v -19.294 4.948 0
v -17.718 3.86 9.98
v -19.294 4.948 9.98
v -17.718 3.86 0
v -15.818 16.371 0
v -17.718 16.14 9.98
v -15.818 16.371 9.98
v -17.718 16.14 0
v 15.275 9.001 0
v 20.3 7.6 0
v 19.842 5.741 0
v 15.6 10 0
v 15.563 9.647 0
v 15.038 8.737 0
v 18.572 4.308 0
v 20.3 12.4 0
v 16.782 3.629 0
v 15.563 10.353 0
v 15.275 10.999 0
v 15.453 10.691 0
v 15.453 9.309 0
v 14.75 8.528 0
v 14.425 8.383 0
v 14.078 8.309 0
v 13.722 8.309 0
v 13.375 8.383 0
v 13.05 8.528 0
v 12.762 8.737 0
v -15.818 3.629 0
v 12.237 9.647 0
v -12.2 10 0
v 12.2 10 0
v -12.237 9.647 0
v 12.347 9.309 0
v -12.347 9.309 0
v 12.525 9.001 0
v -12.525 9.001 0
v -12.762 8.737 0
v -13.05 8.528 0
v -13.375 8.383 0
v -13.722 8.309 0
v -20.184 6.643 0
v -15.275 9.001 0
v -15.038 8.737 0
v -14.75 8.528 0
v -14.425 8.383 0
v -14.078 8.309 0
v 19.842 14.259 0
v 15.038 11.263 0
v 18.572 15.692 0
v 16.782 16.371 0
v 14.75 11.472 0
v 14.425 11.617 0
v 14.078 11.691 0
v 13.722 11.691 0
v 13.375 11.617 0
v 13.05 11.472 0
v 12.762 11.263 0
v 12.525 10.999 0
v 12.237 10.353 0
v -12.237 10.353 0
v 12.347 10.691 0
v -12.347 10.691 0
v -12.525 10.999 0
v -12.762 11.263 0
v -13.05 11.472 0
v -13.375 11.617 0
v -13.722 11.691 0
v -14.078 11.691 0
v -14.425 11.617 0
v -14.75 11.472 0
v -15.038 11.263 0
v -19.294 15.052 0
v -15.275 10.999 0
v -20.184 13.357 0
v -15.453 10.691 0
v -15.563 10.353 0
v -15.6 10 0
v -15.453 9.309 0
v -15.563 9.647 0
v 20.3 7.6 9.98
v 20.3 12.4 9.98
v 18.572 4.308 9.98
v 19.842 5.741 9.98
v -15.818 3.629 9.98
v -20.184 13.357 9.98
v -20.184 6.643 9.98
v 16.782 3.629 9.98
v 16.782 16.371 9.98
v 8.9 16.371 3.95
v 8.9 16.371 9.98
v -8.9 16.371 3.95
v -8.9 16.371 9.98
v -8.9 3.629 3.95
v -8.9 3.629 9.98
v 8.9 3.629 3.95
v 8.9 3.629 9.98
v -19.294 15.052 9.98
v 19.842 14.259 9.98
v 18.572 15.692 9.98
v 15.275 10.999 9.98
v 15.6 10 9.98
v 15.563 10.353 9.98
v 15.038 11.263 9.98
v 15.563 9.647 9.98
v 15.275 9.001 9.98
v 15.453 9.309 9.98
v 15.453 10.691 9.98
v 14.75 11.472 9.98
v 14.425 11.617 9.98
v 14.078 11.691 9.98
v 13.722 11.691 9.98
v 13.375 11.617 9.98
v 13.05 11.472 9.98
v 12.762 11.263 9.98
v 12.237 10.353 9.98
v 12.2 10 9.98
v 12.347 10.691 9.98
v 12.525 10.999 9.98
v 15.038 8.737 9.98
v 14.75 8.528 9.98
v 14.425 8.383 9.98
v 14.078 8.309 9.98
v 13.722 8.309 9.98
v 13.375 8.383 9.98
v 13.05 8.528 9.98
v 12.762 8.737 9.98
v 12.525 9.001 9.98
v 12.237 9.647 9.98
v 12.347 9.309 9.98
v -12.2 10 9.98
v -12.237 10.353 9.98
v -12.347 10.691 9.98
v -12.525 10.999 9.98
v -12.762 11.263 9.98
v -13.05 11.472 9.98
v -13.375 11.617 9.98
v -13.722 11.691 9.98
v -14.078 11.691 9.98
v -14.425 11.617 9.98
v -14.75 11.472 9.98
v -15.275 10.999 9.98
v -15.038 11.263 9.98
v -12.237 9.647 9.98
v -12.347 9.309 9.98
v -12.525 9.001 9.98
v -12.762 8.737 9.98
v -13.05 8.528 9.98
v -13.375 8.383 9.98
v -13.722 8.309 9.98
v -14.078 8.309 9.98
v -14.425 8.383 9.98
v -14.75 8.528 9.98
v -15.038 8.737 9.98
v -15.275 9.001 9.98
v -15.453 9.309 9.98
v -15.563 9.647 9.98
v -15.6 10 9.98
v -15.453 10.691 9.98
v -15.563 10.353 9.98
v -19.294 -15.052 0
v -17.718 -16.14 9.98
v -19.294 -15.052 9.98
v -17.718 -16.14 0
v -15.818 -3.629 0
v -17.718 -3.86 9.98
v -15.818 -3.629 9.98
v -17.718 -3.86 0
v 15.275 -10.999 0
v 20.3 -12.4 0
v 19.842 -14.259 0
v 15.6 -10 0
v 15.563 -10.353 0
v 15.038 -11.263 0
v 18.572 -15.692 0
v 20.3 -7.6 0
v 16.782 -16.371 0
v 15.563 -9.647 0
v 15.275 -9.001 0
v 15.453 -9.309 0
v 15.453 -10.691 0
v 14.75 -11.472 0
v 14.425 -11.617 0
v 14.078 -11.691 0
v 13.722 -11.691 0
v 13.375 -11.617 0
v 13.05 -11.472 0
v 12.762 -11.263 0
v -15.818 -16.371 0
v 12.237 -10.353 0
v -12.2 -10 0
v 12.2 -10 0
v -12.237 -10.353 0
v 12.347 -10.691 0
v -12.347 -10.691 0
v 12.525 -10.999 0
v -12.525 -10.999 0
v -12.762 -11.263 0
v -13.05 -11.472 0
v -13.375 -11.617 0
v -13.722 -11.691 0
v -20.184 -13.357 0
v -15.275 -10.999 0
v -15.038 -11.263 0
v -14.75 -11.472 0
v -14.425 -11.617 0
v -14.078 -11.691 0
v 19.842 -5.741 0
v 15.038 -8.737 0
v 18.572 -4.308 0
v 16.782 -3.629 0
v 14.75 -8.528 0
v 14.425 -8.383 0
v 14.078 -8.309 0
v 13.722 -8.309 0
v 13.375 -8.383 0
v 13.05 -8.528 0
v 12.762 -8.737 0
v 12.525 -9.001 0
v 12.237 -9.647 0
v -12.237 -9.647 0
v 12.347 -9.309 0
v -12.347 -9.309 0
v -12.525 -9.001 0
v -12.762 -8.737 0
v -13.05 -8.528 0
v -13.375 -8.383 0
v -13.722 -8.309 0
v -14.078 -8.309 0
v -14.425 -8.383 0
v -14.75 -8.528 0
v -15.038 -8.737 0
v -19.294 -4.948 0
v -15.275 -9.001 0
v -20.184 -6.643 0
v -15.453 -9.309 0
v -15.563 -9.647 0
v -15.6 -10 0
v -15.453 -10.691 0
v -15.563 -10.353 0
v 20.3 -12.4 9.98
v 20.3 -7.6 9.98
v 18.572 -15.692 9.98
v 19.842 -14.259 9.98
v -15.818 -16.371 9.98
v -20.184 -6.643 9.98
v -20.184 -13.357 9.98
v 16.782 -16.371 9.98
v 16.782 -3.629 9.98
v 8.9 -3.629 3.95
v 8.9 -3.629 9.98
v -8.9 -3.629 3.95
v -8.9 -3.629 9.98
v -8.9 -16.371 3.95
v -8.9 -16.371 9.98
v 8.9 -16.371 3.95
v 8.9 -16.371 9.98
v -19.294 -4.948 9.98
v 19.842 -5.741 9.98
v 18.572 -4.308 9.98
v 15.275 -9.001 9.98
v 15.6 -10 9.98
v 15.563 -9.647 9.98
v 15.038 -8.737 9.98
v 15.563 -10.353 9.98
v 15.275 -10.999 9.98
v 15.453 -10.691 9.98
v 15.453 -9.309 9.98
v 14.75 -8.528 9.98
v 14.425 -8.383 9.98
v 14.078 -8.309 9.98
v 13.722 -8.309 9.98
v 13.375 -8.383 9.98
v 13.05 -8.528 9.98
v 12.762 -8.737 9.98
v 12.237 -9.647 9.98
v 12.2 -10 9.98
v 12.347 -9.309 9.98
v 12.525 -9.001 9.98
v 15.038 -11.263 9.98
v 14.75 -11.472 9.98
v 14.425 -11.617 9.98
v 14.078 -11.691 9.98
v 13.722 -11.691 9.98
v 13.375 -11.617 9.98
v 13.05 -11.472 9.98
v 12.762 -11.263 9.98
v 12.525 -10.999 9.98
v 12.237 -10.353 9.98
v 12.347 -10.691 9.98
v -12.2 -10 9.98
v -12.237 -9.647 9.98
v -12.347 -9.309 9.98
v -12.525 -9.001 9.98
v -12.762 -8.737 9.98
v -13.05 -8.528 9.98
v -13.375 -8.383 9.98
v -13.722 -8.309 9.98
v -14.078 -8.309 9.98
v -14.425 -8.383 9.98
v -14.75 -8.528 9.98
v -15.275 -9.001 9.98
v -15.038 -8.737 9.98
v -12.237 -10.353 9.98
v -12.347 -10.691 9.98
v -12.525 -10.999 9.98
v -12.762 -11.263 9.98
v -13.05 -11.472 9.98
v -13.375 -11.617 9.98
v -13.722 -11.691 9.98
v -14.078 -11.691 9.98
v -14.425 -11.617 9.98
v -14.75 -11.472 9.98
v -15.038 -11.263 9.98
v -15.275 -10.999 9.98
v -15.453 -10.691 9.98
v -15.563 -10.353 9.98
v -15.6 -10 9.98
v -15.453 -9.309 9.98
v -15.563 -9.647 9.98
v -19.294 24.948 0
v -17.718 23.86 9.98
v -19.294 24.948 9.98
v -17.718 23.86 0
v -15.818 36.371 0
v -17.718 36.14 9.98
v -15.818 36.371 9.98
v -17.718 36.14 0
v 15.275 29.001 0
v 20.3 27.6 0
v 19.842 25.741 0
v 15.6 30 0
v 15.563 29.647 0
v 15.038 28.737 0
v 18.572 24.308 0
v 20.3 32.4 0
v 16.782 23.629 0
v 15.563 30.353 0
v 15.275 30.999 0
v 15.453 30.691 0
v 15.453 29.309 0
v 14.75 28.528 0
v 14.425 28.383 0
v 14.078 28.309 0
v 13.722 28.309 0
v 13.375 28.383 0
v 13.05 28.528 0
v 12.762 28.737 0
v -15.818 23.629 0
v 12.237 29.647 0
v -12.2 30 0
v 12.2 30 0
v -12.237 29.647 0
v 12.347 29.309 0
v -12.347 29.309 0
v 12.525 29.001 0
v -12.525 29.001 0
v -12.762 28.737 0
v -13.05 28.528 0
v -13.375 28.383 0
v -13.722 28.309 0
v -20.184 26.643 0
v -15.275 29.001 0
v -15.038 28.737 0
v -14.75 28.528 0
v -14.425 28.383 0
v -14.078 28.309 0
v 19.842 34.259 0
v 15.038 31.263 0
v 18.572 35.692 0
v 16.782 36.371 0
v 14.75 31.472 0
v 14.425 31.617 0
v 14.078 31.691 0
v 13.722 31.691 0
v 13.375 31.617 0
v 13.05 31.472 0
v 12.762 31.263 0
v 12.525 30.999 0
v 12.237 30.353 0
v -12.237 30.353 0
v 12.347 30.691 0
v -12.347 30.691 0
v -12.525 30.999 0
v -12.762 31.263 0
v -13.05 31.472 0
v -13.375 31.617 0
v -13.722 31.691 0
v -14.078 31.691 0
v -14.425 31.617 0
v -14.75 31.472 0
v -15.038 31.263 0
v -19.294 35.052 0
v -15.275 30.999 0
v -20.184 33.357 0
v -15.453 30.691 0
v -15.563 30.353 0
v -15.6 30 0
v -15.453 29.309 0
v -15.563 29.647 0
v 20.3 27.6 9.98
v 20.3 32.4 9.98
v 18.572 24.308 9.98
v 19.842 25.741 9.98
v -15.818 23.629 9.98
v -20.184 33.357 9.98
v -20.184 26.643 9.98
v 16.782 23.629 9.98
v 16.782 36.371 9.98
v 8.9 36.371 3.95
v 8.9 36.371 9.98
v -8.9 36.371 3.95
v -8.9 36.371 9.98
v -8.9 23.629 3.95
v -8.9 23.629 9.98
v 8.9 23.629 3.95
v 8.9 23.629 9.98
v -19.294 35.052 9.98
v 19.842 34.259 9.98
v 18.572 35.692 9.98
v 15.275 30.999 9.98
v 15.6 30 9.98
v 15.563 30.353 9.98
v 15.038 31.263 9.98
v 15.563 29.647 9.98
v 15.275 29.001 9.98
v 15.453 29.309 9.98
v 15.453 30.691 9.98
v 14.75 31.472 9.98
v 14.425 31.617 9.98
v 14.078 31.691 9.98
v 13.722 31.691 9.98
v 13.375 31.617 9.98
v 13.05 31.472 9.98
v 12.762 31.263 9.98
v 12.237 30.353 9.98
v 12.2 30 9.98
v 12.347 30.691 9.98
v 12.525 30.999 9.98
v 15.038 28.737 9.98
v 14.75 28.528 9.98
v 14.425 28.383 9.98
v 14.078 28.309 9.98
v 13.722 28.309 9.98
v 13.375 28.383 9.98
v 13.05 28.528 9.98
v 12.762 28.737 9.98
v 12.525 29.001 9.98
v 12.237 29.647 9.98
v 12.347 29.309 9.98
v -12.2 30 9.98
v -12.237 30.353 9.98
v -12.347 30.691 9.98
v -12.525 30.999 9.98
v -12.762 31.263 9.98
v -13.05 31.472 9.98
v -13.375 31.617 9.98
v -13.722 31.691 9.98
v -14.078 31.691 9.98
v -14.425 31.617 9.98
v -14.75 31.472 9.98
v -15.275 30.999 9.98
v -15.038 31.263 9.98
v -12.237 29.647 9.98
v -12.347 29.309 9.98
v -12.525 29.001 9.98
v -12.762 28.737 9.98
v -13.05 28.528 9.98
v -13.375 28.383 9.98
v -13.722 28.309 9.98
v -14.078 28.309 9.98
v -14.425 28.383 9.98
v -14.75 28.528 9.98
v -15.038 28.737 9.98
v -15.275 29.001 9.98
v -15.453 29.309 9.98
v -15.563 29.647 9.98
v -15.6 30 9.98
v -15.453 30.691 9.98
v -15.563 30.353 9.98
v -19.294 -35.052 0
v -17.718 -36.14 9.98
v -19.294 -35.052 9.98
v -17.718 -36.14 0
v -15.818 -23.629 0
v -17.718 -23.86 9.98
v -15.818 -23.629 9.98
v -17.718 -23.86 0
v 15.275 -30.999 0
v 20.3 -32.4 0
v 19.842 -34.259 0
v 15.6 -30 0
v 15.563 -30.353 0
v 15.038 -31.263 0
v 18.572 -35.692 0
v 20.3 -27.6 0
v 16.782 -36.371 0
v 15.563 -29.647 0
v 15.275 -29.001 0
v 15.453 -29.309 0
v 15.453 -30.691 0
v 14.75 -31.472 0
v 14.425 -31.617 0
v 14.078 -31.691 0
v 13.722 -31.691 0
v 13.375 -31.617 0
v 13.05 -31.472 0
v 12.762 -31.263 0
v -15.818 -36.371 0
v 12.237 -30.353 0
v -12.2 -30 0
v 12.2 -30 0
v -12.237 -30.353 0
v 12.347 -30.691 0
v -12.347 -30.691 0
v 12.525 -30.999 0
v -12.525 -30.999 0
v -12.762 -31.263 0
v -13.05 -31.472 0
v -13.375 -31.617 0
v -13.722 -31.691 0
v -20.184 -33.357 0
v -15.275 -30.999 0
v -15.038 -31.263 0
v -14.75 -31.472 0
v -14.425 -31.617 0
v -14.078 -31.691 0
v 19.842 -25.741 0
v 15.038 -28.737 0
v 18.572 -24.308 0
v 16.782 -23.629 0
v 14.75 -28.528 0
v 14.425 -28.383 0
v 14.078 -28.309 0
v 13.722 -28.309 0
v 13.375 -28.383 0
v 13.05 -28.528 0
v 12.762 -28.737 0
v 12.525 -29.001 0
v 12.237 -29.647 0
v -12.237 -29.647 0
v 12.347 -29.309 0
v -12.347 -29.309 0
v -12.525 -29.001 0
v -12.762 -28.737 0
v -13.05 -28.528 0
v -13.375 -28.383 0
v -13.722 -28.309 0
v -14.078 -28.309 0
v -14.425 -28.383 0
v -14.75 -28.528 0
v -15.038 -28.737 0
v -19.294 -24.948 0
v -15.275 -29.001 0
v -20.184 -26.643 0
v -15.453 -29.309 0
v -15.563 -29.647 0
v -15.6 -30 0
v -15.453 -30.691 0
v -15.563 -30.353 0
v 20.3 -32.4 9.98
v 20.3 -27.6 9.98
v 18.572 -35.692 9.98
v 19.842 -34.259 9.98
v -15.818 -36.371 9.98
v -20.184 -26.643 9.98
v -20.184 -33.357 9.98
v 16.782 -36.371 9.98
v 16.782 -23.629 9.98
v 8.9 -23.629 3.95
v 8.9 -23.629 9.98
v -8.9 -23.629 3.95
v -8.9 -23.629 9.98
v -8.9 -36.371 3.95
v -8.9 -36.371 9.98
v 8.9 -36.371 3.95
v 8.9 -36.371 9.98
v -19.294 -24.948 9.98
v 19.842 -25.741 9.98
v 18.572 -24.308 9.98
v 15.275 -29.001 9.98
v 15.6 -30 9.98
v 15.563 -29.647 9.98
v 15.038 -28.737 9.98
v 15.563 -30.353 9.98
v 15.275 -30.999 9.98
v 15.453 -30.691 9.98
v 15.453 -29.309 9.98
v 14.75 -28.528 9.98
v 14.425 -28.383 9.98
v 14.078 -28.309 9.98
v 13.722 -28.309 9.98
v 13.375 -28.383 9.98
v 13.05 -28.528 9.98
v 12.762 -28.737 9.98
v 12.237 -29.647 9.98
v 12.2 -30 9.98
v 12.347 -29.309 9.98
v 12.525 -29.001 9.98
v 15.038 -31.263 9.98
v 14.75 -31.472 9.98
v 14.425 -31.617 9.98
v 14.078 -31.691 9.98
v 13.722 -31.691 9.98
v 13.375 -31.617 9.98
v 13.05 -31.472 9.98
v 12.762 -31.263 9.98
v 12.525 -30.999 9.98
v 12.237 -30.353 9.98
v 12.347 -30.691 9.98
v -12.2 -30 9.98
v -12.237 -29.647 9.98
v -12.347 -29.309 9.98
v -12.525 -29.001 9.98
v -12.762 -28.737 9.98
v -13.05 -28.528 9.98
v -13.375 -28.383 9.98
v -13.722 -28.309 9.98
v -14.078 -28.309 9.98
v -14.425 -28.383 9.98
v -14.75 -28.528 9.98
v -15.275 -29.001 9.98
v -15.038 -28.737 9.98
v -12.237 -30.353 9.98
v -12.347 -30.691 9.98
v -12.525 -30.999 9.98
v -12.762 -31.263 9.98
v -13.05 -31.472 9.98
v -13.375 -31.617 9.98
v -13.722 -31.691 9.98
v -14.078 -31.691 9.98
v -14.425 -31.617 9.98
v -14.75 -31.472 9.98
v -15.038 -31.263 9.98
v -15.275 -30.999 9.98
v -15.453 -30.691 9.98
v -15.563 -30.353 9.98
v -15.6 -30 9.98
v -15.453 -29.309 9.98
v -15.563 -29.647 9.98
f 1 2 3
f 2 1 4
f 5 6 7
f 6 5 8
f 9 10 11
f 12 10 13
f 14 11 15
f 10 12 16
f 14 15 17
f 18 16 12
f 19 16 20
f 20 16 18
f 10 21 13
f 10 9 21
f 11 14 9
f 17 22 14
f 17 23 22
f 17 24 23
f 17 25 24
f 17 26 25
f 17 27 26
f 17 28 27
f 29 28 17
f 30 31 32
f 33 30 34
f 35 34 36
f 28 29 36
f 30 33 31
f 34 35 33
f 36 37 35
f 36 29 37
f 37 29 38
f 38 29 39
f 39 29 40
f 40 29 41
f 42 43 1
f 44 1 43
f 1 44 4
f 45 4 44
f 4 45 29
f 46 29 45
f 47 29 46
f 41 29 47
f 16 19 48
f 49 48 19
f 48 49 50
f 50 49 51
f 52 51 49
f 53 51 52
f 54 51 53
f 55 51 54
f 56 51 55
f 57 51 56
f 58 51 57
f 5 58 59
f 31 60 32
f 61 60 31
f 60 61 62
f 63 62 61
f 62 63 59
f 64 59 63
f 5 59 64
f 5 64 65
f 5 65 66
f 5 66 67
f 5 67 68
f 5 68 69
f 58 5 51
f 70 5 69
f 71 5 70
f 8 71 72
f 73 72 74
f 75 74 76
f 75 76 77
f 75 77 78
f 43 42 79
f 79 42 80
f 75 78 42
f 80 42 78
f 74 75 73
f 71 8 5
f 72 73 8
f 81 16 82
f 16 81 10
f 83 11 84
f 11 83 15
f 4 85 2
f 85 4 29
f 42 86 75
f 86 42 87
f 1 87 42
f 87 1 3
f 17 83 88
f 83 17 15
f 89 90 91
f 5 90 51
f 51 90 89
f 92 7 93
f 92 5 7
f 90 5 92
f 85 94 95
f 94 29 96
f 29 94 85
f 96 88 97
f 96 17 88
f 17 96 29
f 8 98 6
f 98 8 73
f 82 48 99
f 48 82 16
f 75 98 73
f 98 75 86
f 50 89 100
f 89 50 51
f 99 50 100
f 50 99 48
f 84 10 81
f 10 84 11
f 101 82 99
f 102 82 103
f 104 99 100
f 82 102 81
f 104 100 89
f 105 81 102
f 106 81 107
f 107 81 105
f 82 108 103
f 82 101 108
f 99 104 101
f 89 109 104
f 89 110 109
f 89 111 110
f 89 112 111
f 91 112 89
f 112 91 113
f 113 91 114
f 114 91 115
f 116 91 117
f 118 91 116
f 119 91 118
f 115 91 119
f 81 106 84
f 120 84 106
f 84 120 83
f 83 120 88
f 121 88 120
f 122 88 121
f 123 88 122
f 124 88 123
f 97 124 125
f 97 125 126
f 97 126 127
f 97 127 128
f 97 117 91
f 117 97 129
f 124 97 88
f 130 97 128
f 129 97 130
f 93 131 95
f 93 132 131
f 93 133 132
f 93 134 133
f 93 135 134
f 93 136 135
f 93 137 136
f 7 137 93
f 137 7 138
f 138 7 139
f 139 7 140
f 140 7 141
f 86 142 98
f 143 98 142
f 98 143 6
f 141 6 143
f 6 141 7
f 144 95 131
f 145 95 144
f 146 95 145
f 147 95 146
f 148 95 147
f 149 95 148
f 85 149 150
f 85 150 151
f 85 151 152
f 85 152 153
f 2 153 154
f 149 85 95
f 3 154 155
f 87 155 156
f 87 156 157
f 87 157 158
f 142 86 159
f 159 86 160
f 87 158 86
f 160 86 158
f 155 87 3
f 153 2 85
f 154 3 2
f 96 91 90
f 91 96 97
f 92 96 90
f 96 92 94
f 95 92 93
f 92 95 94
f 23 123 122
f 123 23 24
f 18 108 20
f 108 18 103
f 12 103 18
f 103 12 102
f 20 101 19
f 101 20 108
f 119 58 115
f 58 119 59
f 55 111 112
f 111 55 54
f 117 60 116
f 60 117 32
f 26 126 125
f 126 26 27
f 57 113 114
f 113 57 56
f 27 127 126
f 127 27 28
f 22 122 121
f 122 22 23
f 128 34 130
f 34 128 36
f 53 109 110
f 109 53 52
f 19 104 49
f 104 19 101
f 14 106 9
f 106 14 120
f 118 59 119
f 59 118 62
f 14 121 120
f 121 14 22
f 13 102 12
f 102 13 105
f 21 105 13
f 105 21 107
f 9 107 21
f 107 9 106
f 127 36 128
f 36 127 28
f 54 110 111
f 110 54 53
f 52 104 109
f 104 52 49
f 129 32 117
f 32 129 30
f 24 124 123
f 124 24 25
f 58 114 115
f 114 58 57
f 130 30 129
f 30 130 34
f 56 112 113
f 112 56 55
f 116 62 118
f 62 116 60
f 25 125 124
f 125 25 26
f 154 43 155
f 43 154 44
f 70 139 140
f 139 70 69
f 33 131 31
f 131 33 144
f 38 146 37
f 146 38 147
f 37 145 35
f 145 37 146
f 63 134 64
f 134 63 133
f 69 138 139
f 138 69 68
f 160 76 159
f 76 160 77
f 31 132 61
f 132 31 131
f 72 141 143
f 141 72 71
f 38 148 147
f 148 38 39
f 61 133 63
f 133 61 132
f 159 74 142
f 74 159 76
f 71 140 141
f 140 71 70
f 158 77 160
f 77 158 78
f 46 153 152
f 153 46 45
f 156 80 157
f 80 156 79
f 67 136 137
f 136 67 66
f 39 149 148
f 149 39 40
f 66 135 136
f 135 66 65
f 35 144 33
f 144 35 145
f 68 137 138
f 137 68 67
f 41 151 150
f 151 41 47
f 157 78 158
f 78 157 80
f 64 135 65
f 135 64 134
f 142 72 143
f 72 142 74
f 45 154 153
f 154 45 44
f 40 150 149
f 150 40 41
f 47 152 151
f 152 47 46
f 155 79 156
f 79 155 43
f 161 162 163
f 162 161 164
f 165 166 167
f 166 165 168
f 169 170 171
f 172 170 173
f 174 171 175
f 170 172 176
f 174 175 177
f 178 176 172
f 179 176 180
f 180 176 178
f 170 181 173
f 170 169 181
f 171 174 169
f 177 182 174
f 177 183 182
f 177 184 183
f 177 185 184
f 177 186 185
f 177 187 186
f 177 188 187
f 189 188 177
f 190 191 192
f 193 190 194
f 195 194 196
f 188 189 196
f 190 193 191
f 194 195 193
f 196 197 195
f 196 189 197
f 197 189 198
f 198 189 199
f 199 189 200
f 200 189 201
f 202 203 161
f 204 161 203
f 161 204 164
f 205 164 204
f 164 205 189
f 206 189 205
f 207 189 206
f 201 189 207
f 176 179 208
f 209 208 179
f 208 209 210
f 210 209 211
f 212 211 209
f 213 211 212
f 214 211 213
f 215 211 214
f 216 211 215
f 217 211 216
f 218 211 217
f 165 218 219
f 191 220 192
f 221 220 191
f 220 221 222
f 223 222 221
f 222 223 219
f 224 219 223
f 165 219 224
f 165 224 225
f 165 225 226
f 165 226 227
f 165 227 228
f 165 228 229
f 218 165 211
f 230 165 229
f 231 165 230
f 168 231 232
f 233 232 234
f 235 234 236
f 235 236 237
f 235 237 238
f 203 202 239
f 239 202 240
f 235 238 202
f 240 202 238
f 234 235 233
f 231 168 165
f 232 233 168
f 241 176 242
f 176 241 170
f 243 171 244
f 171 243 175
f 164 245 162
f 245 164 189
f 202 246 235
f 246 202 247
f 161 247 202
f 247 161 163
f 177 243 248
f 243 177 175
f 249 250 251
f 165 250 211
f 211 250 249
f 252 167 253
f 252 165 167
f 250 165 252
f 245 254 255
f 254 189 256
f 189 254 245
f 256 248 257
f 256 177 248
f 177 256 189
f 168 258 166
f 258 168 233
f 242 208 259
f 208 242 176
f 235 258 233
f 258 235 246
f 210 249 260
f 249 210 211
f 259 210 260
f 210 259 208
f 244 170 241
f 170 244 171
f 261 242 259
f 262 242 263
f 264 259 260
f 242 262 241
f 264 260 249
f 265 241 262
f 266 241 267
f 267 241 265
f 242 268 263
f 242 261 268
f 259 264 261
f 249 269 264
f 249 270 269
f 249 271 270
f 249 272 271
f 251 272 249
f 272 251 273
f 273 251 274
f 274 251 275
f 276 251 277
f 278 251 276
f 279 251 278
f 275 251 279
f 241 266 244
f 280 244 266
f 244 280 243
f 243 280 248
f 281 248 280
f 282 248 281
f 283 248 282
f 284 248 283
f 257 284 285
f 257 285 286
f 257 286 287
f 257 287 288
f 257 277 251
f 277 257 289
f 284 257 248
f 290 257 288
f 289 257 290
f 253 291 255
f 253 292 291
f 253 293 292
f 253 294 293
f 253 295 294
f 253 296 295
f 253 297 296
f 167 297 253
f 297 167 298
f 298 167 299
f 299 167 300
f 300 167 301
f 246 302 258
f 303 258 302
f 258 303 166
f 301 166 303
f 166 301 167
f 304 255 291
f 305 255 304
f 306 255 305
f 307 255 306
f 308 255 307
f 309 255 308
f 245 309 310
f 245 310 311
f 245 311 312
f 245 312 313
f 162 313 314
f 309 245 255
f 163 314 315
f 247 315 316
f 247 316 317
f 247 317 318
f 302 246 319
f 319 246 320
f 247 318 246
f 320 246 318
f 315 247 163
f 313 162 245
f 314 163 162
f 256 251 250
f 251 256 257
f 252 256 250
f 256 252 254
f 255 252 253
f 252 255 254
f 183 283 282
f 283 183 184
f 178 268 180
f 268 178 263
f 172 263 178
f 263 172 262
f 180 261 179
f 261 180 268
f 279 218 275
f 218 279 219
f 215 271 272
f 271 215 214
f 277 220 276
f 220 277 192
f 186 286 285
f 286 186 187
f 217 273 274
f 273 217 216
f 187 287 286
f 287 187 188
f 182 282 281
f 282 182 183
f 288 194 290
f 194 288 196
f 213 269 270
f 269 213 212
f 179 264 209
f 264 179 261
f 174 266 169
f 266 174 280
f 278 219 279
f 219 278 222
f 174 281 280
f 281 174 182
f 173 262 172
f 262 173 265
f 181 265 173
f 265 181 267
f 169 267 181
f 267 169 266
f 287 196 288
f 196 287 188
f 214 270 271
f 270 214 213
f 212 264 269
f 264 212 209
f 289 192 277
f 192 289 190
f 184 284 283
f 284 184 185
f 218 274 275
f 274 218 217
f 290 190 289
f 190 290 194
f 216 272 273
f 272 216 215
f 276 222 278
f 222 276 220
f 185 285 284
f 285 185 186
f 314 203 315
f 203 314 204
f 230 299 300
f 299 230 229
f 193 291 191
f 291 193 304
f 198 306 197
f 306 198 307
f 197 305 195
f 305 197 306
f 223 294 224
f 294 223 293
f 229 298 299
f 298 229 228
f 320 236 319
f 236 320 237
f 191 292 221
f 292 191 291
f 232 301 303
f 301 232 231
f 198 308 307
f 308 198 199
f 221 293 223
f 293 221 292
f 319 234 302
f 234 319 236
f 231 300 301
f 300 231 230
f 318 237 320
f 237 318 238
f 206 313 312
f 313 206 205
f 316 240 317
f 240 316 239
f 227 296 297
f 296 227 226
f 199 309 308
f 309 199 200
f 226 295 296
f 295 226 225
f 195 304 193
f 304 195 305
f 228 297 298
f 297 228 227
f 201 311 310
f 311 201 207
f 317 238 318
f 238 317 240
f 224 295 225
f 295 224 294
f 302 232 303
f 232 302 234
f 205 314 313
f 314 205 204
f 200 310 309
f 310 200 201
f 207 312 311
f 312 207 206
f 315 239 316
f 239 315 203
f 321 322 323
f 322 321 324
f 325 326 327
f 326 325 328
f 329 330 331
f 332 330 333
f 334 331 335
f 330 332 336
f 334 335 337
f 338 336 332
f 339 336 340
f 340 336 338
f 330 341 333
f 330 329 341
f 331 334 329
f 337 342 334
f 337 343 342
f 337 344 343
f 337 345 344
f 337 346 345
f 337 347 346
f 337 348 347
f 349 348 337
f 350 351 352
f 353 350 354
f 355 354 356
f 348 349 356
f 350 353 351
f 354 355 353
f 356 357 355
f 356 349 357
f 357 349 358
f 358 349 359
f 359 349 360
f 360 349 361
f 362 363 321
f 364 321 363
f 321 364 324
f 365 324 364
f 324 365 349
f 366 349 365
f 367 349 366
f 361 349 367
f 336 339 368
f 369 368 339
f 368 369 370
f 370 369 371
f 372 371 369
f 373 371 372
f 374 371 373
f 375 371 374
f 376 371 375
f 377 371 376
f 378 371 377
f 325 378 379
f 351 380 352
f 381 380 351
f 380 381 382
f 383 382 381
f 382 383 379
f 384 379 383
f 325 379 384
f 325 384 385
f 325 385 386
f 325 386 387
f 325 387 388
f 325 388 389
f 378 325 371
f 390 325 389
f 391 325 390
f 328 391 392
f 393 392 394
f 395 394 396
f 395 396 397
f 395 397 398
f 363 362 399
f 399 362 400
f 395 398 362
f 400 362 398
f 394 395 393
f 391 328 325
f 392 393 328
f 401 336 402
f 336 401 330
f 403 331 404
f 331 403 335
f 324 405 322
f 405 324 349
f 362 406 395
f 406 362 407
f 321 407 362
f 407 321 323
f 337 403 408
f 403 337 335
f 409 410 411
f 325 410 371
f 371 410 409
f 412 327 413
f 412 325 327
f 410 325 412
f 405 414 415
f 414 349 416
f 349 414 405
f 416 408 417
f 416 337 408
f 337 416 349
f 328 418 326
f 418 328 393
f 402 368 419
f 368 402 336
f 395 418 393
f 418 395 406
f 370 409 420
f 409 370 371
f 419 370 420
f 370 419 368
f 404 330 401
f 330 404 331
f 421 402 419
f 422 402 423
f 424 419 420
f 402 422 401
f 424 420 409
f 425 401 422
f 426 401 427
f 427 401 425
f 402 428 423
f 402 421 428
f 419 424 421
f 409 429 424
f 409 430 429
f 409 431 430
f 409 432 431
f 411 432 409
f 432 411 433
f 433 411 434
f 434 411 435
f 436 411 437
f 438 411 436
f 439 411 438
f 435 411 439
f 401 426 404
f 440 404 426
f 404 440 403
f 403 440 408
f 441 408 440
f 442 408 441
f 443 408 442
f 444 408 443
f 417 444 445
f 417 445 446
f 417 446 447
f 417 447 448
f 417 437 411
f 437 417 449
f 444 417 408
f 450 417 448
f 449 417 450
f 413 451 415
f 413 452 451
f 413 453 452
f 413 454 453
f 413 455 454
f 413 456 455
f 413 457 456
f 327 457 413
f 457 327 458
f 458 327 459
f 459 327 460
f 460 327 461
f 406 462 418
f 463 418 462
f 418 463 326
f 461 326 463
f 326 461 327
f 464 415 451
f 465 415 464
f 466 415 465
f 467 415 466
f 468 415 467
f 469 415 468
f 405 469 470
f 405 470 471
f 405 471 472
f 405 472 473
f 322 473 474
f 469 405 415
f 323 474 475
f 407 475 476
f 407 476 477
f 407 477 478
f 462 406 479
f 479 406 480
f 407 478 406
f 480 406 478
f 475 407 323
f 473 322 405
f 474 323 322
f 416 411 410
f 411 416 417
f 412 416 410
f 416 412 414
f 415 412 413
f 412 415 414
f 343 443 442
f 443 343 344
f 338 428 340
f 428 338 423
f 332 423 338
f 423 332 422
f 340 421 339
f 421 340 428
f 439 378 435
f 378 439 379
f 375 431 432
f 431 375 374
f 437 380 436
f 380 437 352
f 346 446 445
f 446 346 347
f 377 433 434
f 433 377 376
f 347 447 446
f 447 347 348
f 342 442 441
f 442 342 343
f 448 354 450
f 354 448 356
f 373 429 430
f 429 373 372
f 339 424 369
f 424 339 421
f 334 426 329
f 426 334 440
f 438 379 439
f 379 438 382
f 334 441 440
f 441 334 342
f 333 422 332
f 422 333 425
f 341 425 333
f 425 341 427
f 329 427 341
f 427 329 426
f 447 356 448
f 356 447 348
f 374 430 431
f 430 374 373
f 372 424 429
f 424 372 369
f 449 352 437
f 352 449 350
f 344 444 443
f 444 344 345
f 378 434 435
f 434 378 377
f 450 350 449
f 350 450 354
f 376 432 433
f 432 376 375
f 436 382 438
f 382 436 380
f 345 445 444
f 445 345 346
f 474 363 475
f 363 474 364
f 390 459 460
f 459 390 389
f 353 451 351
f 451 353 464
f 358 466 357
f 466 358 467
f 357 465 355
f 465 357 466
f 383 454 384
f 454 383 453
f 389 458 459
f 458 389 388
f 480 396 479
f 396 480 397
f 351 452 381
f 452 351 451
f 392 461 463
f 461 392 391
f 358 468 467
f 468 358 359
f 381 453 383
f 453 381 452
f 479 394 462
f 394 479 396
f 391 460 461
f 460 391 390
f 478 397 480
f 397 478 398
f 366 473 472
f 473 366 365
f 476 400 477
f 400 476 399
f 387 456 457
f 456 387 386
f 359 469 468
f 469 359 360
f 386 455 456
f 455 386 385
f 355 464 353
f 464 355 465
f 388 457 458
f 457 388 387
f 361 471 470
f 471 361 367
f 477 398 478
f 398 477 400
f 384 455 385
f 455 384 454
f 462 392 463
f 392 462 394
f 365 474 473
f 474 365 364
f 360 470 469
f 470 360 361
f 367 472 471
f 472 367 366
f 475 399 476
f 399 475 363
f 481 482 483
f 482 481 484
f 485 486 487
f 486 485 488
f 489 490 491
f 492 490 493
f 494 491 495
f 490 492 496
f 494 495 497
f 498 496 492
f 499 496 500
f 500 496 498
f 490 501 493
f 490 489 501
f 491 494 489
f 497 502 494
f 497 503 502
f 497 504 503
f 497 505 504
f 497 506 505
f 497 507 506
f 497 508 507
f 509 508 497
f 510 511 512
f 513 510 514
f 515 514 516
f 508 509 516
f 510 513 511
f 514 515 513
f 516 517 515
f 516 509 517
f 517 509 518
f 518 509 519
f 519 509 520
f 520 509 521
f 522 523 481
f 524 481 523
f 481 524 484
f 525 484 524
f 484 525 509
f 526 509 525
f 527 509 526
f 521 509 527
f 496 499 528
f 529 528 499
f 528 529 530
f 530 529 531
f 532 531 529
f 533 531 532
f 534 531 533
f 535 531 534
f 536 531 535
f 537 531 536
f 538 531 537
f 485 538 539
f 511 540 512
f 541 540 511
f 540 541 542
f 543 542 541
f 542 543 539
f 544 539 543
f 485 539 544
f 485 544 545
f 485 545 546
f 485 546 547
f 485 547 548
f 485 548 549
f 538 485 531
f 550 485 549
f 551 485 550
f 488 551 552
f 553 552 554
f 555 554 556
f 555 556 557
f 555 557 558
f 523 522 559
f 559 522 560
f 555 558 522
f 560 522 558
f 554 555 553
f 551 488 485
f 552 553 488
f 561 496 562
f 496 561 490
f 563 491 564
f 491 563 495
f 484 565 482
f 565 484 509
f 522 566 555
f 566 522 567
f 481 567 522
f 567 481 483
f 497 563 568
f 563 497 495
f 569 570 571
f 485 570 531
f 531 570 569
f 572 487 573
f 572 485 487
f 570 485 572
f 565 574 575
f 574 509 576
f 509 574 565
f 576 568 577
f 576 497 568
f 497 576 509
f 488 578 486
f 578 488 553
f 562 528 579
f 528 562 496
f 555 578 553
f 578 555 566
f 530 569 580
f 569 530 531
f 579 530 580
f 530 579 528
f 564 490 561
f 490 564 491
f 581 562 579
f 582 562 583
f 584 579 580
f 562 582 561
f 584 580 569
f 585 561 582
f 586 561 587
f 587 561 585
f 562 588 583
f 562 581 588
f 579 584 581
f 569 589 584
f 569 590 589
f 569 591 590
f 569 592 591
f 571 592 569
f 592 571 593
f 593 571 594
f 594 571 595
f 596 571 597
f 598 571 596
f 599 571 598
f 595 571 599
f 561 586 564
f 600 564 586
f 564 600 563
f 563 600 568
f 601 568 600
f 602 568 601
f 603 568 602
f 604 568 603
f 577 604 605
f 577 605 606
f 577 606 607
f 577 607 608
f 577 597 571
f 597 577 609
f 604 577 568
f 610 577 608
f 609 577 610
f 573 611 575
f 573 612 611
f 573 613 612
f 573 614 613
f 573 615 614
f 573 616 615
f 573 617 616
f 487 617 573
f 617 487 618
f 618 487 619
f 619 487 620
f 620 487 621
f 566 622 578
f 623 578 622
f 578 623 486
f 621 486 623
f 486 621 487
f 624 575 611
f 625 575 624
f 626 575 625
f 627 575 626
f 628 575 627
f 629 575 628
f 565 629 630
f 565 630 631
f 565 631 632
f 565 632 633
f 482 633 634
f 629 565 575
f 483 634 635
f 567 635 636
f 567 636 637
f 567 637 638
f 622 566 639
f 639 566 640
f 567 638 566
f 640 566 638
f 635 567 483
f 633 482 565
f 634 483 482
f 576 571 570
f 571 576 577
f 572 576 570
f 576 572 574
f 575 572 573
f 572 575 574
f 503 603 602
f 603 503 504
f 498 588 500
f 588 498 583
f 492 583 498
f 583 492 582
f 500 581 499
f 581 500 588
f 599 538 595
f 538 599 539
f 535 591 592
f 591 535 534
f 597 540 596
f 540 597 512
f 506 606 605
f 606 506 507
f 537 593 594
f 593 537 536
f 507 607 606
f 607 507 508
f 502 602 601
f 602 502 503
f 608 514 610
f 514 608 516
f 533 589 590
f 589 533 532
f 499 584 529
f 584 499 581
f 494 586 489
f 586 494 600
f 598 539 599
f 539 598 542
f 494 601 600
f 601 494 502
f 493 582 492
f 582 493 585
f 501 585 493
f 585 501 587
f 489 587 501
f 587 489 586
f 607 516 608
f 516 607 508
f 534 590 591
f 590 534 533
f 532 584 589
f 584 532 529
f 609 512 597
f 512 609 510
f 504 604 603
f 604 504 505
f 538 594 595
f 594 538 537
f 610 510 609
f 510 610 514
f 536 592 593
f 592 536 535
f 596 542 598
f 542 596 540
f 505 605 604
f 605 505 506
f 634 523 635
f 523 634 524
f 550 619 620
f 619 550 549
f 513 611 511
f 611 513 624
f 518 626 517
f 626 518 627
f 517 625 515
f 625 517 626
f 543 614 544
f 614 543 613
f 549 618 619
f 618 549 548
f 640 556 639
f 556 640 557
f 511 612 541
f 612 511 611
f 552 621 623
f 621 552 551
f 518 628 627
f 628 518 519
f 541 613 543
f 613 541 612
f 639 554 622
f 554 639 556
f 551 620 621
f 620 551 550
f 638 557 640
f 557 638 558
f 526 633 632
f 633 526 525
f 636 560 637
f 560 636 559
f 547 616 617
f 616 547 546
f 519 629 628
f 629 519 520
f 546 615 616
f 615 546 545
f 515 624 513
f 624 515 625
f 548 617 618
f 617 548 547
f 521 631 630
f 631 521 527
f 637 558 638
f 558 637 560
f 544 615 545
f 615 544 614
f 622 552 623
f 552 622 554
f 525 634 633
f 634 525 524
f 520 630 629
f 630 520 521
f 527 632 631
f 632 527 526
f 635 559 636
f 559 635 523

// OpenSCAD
// file: dronePlates.scad
/**
 * dronePlates.scad
 * Plate library
 *
 * GNU GPL V3
 * @author: Victor Potenciano
 */

m3Rad = 3.4/2;
cornerR = 4;

/**
 *
 */
module helperDisk(diameter) {
	cylinder(r = diameter/2, h = 0.6, $fn=20);
}

/**
 *
 */
module roundedRect(size, radius) {
	x = size[0];
	y = size[1];
	z = size[2];

	linear_extrude(height=z)
	hull() {
	// place 4 circles in the corners, with the given radius
	translate([(-x/2)+(radius/2), (-y/2)+(radius/2), 0]){ circle(r=radius); }
	translate([(x/2)-(radius/2), (-y/2)+(radius/2), 0]){ circle(r=radius); }
	translate([(-x/2)+(radius/2), (y/2)-(radius/2), 0]){ circle(r=radius); }
	translate([(x/2)-(radius/2), (y/2)-(radius/2), 0]){ circle(r=radius); }
	}
}

/**
 * rounded rectangle triangle with corner at origin
 */
module roundedTriangle(size, radius) {
	x = size[0];
	y = size[1];
	z = size[2];

	linear_extrude(height=z)
	hull() {
	translate([radius, radius, 0]){ circle(r=radius); }
	translate([x-radius, radius, 0]){ circle(r=radius); }
	translate([radius, y-radius, 0]){ circle(r=radius); }
	}
}

/**
 *
 */
module roundRectPlate(w, l, plateThick=3) {
	difference(){
		roundedRect([l+m3Rad*1.75,w+m3Rad*1.75,plateThick], cornerR);
		translate([l/2, w/2, -0.5]) { cylinder(h = plateThick+1, r = m3Rad, $fn=30); }
		translate([-l/2, w/2, -0.5]) { cylinder(h = plateThick+1, r = m3Rad, $fn=30); }
		translate([l/2, -w/2, -0.5]) { cylinder(h = plateThick+1, r = m3Rad, $fn=30); }
		translate([-l/2, -w/2, -0.5]) { cylinder(h = plateThick+1, r = m3Rad, $fn=30); }
	}
}

/**
 *
 */
module crossSquarePlate(l, thick=3) {
	inDist = cornerR*2+4;
	trianL = sqrt((l*l)/2)-inDist;
	centerR = 4;

	difference(){
		roundRectPlate(l, l, thick);
		translate([0, centerR, -0.5]) { 
			rotate([0,0,45]){ roundedTriangle([trianL,trianL,thick+1], cornerR-2); }
		}
		translate([0, -centerR, -0.5]) { 
			rotate([0,0,225]){ roundedTriangle([trianL,trianL,thick+1], cornerR-2); }
		}
		translate([-centerR, 0, -0.5]) { 
			rotate([0,0,135]){ roundedTriangle([trianL,trianL,thick+1], cornerR-2); }
		}
		translate([centerR, 0, -0.5]) { 
			rotate([0,0,-45]){ roundedTriangle([trianL,trianL,thick+1], cornerR-2); }
		}
	}
}

/**
 *
 */
module hShapePlate(w, l, thick=4) {
	inDist = cornerR*2+1;

	difference(){
		roundRectPlate(w, l, thick);
		translate([0, w/4, -0.5]) { roundedRect([l-inDist,w/2-inDist,thick+1], cornerR-2); }
		translate([0, -w/4, -0.5]) { roundedRect([l-inDist,w/2-inDist,thick+1], cornerR-2); }
	}
}

/**
 *
 */
module motorCircleMount(inDia, outDia, thick=3, extraH=false, d1=19, d2=16, holeR=m3Rad ) {
	difference(){
		cylinder(h = thick, r = outDia/2, $fn=30);
		motorCircleMountHoles(inDia, outDia, thick, extraH, d1=d1, d2=d2, holeR=holeR);
	}
}

/**
 *
 */
module motorCircleMountHoles(inDia, outDia, thick=3, extraH=false, d1=19, d2=16, d3=25, holeR=m3Rad) {
	translate([0, 0, -0.5]) { cylinder(h = thick+1, r = inDia/2, $fn=30); }

	for(i=[0:3]) {
		rotate([0,0,90*i]){
		translate([d1/2, 0, -0.5]) cylinder(h = thick+1, r = holeR, $fn=20);
		translate([d2/2, 0, -0.5]) cylinder(h = thick+1, r = holeR, $fn=20);
		translate([d2/2, -holeR, -0.5]) cube(size = [(d1-d2)/2,holeR*2,thick+1]);
		}
	}
	
	if(extraH==true){	
		for(i=[-1,1]) translate([i*d3/2, 0, -0.5]) { cylinder(h = thick+1, r = holeR, $fn=30); }
	}
}

/**
 *
 */
module motorRectMount(w, l, inDia, thick=3) {
	d1=19;
	d2=16;

	difference(){
		roundRectPlate(w, l, thick);
		translate([0, 0, -0.5]) { cylinder(h = thick+1, r = inDia/2, $fn=30); }
		translate([0, d1/2, -0.5]) { cylinder(h = thick+1, r = m3Rad, $fn=30); }
		translate([0, -d1/2, -0.5]) { cylinder(h = thick+1, r = m3Rad, $fn=30); }
		translate([d2/2, 0, -0.5]) { cylinder(h = thick+1, r = m3Rad, $fn=30); }
		translate([-d2/2, 0, -0.5]) { cylinder(h = thick+1, r = m3Rad, $fn=30); }
	}
}

/**
 *
 */
module tube(inDia, outDia, height) {
	difference(){
		cylinder(h = height, r = outDia/2, $fn=50);
		translate([0, 0, -0.5]) { cylinder(h = height+1, r = inDia/2, $fn=30); }
	}
}

/**
 *
 */
module squareTube(inDia, outDia, height) {
	translate([0,0,height/2]){
	difference(){
		cube(size = [outDia,outDia,height], center = true);
		cube(size = [inDia,inDia,height+1], center = true);
	}
	}
}

/**
 *
 */
module djiFlamewheelHoles(height) {
	a = 23;
	b = 16;
	c = 19.5;
	
	translate([a/2, c/2, 0]) { cylinder(h = height, r = m3Rad, $fn=30); }
	translate([-a/2, c/2, 0]) { cylinder(h = height, r = m3Rad, $fn=30); }
	translate([b/2, -c/2, 0]) { cylinder(h = height, r = m3Rad, $fn=30); }
	translate([-b/2, -c/2, 0]) { cylinder(h = height, r = m3Rad, $fn=30); }
}

/**
 *
 */
module djiFlamewheelHolesBotton(height) {
	a1 = 21;
	c = 19.5;
	
	translate([a1/2, c/2, 0]) { cylinder(h = height, r = m3Rad, $fn=30); }
	translate([-a1/2, c/2, 0]) { cylinder(h = height, r = m3Rad, $fn=30); }
}

/**
 *
 */
module propeller(size){
union(){
difference(){
	cylinder(h = 3, r = size/2, center=true, $fn=30);
	cylinder(h = 3.1, r = size/2-2, center=true, $fn=30); 
}
for( i = [-1,1] ){
rotate([0,0,45*i]){ cube(size = [size,4,1], center = true); }
}
}
}

/**
 *
 */
module slot(length, height, rad){
for(i=[-1,1]) translate([i*length/2,0,0]) cylinder(h = height, r = rad, $fn=30);
translate([0,0,height/2]) cube(size = [length,rad*2,height], center = true);
}

 

////////////////////////
// Examples:
////////////////////////

motorCircleMount(8, 25, 3.5);

//roundedRect([50,50,3], 4);

//hShapePlate(79, 25);

//rotate([0,0,45]){roundedTriangle([40,40,3], 4);}

//crossSquarePlate(45, 4);

/*
union(){
motorRectMount(21, 18, 8, 4);
translate([9, 10.5, 0]) {tube(m3Rad*2, 6.5, 6);}
}
*/

/*
difference(){
union(){
hShapePlate(50, 30, 3.5);
translate([-4,-25,0]){cube(size = [8,50,3.5]);}
rotate([0, 0, 45]) {motorCircleMount(8, 35, 3.5);}
}
cylinder(h = 10, r = 4, $fn=100, center=true);
}
*/

//rotate([90,0,0]){ tube(5,10,20); }
//translate([20,0,0]){ squareTube(5, 10, 20); }
// main file
/**
 * TBS disco XL motor mount clamp v2
 *
 */

use <dronePlates.scad>


m3Rad = 3.4/2;
plateThick = 5;
armWidth = 12.8;
mountDia = 45;
holesDist = 27;
holesR = 14;
isolator = 2.5;

clampL = armWidth+isolator*2+m3Rad*4+12;
clampH2 = armWidth*0.35+isolator*0.6;
clampH = plateThick+3+clampH2;
clampHAux = clampH2+4;

/**
 *
 */
module clamp(height, h2, counter=0 ){
difference(){
	roundedRect([clampL,armWidth-4,height], 4);
	translate([0,0,height-h2/2]){ cube(size=[armWidth+isolator*2,armWidth+1,h2+0.1],center=true); }
	//holes	
	translate([armWidth/2+isolator+5,0,height/2]){ cylinder(h=height+1, r=m3Rad, $fn=30, center=true); }
	translate([-(armWidth/2+isolator+5),0,height/2]){ cylinder(h=height+1, r=m3Rad, $fn=30, center=true); }

	if(counter>0){
		translate([armWidth/2+isolator+5,0,counter/2]){ cylinder(h = counter+0.1, r=4, $fn=30, center=true); }
		translate([-(armWidth/2+isolator+5),0,counter/2]){ cylinder(h = counter+0.1, r=4, $fn=30, center=true); }
	}
}//diff
}//end module clamp


translate([0,10,0]){ clamp(clampHAux, clampH2); }
translate([0,-10,0]){ clamp(clampHAux, clampH2); }
translate([0,30,0]){ clamp(clampHAux, clampH2); }
translate([0,-30,0]){ clamp(clampHAux, clampH2); }
